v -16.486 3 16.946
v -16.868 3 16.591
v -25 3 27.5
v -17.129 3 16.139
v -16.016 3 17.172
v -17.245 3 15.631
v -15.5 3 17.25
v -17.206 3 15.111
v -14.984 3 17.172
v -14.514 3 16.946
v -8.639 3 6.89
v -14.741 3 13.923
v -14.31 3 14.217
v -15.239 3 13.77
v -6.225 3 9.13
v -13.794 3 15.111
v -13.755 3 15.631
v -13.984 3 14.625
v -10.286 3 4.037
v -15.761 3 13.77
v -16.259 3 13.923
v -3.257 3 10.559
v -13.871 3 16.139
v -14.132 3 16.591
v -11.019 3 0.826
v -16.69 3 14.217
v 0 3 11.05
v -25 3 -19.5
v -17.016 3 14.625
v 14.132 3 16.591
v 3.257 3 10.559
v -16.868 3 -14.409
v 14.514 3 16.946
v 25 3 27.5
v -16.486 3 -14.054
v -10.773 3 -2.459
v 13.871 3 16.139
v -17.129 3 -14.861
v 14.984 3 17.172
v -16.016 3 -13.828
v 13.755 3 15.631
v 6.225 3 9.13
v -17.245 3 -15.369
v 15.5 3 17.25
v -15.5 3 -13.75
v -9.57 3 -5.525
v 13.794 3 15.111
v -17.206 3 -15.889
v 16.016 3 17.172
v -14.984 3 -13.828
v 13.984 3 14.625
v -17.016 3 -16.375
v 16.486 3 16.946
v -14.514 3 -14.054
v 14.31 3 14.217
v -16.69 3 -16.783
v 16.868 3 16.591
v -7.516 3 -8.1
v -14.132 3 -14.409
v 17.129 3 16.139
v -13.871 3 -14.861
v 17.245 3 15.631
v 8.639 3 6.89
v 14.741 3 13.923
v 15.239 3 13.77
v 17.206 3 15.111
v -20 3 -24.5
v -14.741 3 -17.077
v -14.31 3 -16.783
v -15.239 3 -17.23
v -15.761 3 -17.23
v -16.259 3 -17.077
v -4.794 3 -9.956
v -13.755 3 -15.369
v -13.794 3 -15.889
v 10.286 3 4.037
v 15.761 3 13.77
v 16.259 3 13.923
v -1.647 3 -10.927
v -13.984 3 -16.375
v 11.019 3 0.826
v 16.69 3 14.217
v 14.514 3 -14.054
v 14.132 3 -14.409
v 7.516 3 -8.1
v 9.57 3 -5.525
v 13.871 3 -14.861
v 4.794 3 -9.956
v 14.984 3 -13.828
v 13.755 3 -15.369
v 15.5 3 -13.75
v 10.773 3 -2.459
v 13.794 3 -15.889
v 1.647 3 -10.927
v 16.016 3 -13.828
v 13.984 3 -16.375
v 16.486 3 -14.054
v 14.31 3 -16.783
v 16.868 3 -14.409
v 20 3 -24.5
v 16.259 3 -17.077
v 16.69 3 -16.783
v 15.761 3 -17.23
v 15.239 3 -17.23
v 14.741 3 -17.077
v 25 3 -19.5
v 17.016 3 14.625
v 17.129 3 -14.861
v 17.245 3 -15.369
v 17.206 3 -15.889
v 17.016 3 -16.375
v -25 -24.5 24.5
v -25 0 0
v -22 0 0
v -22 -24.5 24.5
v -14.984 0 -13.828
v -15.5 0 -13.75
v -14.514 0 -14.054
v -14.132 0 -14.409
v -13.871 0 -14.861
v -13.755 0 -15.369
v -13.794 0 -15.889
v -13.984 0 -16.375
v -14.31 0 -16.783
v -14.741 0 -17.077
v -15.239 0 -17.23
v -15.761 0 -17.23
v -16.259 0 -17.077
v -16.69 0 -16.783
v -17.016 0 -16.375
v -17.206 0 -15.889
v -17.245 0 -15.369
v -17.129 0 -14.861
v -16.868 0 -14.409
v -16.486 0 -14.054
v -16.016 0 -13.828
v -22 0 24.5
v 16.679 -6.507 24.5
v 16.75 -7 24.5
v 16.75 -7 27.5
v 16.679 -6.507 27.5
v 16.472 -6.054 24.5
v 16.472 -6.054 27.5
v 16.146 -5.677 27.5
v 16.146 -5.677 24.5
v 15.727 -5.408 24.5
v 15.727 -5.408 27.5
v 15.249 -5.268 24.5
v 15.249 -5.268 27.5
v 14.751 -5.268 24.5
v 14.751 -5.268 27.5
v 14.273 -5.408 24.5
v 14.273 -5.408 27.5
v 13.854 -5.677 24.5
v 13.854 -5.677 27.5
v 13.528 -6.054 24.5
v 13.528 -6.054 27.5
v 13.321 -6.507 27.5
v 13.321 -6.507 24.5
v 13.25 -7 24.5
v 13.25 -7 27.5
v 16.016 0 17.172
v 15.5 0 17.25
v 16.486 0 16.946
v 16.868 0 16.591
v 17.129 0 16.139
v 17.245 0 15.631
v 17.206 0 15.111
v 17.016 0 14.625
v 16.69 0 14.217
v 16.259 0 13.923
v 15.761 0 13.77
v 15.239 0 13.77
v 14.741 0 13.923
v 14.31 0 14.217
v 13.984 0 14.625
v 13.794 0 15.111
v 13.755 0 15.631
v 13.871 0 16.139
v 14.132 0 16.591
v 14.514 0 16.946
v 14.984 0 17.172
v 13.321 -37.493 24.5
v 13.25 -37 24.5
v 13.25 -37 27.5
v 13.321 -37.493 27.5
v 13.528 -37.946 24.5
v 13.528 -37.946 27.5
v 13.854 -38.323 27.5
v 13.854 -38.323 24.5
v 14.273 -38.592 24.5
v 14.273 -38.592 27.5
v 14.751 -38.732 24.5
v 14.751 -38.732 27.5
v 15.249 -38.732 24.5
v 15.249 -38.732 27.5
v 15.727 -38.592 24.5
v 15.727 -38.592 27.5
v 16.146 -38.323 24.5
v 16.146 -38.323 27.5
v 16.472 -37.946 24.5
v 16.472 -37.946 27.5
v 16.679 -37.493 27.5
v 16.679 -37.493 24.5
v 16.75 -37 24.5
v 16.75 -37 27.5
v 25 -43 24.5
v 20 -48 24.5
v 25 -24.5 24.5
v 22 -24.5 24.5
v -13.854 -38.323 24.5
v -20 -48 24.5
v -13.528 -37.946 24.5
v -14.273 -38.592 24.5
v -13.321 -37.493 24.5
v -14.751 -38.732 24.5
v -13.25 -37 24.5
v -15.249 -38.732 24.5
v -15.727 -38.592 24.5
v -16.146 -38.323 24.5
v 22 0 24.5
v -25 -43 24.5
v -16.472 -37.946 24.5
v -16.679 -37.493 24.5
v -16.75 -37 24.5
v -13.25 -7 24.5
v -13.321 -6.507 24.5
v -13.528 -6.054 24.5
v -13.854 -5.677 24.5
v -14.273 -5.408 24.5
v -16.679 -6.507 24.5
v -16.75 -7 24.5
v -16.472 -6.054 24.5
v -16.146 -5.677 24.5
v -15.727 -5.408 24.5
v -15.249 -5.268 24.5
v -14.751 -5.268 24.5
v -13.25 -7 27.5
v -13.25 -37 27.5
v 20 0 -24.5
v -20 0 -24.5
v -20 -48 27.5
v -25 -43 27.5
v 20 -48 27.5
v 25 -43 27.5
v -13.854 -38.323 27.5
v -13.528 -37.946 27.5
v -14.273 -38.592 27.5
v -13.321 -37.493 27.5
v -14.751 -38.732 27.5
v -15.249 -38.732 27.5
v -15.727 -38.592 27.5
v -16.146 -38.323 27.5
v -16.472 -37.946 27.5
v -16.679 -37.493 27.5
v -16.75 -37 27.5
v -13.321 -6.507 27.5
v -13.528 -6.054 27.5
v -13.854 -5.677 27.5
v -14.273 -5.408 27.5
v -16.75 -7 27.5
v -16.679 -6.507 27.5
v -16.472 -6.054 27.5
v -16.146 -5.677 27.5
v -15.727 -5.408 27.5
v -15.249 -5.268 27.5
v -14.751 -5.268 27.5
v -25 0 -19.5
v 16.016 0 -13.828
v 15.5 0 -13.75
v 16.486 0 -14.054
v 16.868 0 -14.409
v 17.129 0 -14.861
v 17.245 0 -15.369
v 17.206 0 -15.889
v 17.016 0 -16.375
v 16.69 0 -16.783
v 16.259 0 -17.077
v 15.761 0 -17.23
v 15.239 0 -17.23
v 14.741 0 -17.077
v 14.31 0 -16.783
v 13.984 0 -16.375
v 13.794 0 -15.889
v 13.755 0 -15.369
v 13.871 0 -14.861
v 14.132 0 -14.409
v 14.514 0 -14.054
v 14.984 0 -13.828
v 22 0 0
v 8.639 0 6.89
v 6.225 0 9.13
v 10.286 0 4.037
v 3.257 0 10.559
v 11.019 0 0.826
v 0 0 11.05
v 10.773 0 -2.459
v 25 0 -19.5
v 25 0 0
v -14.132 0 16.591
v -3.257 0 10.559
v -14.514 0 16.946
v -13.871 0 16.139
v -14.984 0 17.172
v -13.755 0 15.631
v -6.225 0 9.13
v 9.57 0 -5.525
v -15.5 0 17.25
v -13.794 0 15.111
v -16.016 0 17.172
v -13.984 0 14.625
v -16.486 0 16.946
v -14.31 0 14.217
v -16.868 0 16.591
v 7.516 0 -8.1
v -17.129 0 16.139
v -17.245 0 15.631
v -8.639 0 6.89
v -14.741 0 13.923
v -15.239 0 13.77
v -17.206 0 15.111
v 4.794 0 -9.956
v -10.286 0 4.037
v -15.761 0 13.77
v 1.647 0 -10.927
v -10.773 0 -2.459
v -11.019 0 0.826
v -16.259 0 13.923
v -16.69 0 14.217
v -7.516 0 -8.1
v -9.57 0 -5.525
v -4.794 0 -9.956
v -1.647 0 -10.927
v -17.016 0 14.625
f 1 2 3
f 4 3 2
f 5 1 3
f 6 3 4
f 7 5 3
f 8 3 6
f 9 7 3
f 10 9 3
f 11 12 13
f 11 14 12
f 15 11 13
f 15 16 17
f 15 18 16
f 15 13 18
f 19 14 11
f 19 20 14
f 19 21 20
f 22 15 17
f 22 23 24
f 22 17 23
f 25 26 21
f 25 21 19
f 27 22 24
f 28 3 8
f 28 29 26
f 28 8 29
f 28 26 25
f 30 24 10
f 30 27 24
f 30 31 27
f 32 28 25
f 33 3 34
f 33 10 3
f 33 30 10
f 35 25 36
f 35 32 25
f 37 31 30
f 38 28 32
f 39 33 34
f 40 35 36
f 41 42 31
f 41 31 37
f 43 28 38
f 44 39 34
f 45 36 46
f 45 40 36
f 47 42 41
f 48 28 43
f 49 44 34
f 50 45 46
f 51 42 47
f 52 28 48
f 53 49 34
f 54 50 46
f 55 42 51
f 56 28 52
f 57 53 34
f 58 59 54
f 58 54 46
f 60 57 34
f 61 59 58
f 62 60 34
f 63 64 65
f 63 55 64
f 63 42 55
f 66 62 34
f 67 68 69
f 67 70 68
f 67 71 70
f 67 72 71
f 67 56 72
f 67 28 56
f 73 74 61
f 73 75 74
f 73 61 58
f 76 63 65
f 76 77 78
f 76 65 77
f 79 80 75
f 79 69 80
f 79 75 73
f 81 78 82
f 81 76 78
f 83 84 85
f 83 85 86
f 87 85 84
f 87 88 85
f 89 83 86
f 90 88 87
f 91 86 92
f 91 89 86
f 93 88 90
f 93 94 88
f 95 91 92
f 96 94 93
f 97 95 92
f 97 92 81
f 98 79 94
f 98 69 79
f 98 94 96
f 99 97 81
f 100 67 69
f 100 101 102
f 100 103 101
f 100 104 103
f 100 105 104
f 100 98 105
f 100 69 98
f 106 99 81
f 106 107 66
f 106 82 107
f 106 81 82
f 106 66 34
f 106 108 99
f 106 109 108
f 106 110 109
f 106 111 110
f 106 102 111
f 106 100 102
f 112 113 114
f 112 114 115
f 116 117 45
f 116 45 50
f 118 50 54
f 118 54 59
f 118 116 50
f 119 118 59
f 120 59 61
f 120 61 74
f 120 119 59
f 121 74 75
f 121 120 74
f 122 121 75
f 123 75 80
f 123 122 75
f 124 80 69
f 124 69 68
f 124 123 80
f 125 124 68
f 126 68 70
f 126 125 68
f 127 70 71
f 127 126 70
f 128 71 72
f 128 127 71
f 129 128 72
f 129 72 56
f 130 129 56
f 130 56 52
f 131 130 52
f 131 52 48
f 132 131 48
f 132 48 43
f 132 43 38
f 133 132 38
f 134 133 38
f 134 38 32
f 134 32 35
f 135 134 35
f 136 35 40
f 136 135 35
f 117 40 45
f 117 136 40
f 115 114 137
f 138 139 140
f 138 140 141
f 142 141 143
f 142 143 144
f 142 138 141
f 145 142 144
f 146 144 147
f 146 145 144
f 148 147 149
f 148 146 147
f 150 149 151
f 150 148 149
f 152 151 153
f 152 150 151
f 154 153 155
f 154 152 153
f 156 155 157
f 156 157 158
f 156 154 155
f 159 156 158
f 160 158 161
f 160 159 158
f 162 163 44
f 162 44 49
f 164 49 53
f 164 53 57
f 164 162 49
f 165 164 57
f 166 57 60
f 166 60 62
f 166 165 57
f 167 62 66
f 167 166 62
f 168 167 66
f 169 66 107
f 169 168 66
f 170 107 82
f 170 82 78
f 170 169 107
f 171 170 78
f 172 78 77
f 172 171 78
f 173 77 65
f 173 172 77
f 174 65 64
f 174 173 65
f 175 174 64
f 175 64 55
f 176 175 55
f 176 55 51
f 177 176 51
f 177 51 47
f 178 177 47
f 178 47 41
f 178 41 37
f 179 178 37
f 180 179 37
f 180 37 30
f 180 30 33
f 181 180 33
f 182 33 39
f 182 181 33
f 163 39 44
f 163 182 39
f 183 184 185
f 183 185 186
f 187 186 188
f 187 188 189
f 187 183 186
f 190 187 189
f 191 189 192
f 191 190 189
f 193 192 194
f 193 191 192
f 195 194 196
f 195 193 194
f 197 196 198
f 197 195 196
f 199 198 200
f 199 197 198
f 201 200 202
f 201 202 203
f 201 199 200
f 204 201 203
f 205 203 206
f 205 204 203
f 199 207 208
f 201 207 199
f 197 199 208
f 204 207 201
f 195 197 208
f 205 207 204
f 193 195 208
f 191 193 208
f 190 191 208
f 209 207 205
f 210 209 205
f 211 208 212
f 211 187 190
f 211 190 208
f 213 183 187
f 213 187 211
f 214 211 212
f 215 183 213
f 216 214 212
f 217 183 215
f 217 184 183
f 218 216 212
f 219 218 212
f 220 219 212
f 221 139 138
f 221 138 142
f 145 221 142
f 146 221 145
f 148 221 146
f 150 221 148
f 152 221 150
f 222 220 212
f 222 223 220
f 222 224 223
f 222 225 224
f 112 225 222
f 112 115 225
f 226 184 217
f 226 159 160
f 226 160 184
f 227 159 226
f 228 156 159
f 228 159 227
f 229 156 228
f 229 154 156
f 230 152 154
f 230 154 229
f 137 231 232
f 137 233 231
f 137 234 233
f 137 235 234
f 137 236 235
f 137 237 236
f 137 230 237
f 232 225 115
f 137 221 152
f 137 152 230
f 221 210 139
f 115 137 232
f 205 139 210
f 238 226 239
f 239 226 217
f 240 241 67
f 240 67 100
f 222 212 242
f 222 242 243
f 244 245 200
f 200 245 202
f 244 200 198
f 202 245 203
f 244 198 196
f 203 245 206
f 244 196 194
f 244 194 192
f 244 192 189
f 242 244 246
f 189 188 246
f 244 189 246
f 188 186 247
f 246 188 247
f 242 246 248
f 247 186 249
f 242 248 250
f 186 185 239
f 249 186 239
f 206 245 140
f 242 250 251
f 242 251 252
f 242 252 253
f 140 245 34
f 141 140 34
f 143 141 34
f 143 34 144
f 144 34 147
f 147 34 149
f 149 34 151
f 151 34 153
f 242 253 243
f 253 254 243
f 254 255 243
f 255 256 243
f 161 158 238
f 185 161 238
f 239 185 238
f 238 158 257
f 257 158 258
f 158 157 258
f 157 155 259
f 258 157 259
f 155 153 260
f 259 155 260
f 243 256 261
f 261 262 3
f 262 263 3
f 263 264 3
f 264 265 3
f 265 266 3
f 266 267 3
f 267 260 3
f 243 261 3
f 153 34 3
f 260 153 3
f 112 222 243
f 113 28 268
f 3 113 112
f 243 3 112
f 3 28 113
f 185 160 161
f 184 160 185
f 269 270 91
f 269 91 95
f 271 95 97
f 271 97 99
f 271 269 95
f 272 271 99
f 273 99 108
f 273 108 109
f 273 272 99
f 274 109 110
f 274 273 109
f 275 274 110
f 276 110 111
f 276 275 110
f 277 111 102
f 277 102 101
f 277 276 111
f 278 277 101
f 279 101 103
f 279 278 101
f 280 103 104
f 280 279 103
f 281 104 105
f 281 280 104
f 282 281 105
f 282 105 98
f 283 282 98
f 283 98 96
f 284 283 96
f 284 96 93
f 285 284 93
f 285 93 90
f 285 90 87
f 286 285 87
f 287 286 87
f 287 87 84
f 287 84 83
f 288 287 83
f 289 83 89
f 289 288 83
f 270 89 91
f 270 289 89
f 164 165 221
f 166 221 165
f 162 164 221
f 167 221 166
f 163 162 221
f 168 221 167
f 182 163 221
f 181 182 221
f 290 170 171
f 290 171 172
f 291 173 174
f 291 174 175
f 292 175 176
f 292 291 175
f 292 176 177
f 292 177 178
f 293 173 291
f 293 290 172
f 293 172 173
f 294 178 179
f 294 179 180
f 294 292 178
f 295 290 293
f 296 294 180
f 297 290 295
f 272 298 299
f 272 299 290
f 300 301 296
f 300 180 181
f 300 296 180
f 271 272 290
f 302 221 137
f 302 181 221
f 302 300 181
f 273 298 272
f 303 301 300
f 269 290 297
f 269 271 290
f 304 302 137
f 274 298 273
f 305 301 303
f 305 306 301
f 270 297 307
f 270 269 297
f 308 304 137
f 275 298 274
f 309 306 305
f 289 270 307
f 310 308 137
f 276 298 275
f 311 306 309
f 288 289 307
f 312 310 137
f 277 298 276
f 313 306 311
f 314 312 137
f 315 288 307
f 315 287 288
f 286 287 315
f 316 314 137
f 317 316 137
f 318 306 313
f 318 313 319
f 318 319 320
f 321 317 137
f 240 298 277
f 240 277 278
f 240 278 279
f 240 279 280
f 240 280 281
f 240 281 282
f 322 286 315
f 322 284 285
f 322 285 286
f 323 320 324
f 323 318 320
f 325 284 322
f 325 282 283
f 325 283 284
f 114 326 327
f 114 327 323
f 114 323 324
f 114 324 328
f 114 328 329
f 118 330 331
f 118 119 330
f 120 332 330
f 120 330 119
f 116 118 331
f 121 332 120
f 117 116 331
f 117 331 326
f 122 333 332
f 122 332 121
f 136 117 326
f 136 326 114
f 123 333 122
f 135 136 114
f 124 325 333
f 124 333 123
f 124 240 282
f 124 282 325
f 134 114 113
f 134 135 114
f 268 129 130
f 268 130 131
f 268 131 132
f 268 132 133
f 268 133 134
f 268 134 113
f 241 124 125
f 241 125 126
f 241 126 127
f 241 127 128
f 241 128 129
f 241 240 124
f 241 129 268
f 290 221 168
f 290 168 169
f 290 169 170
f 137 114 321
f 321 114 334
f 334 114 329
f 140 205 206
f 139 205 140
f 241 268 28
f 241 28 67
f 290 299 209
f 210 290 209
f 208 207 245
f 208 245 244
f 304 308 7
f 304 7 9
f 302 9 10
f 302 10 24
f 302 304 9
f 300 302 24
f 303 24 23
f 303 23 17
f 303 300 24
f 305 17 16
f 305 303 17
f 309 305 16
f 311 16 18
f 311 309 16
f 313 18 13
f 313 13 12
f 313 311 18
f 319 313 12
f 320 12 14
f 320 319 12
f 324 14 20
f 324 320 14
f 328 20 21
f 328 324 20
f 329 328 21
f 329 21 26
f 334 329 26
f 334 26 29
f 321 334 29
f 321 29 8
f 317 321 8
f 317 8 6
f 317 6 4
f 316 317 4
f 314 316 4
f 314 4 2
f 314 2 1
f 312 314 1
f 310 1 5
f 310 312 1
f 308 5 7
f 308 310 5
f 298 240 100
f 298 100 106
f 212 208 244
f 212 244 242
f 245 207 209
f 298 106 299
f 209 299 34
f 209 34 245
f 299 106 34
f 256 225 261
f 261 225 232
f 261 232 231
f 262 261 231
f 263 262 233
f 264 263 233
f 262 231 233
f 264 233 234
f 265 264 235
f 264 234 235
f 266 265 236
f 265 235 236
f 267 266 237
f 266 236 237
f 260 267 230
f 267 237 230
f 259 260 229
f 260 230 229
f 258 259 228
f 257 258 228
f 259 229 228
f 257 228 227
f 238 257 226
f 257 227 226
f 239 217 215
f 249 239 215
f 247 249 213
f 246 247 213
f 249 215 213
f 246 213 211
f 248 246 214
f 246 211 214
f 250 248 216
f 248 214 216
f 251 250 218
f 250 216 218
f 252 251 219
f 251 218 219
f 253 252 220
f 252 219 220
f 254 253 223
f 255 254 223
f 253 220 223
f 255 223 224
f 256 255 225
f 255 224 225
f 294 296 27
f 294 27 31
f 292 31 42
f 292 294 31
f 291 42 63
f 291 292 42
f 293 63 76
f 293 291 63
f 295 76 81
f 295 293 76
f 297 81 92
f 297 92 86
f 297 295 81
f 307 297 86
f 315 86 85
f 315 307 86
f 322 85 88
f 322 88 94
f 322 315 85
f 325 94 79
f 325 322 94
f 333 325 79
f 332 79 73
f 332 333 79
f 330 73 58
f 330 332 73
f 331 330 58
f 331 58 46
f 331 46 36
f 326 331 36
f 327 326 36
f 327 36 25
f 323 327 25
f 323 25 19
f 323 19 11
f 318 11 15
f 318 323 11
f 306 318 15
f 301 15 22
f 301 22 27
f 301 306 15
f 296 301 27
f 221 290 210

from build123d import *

# Parameters (mm, degrees)
SKETCH_1_R      = 11.05
SKETCH_1_R_2    = 1.75
EXTRUDE_1_DEPTH = 3
EXTRUDE_2_DEPTH = 3
EXTRUDE_3_DEPTH = 3


with BuildPart() as part:
    # 草图1 → 凸台-拉伸1 (new body)
    with BuildSketch(Plane(origin=(0, 0, 0), x_dir=(1, 0, 0), z_dir=(0, 1, 0))):
        Polygon((-25, 19.5), (-20, 24.5), (20, 24.5), (25, 19.5), (25, -24.5), (-25, -24.5), align=None)
        with Locations(Location((0, 0, 0), (0, 0, 270))):
            Circle(SKETCH_1_R, mode=Mode.SUBTRACT)
        with Locations(Location((15.5, 15.5, 0), (0, 0, 270))):
            Circle(SKETCH_1_R_2, mode=Mode.SUBTRACT)
        with Locations(Location((15.5, -15.5, 0), (0, 0, 270))):
            Circle(SKETCH_1_R_2, mode=Mode.SUBTRACT)
        with Locations(Location((-15.5, -15.5, 0), (0, 0, 270))):
            Circle(SKETCH_1_R_2, mode=Mode.SUBTRACT)
        with Locations(Location((-15.5, 15.5, 0), (0, 0, 270))):
            Circle(SKETCH_1_R_2, mode=Mode.SUBTRACT)
    extrude(amount=EXTRUDE_1_DEPTH)

    # 草图3 → 凸台-拉伸2 (add)
    with BuildSketch(Plane.XY.offset(24.5)):
        Polygon((-25, 3), (25, 3), (25, -43), (20, -48), (-20, -48), (-25, -43), align=None)
        with BuildLine():
            Line((-13.25, -7), (-13.25, -37))
            ThreePointArc((-13.25, -37), (-15, -38.75), (-16.75, -37))
            Line((-16.75, -37), (-16.75, -7))
            ThreePointArc((-16.75, -7), (-15, -5.25), (-13.25, -7))
        make_face(mode=Mode.SUBTRACT)
        with BuildLine():
            Line((13.25, -7), (13.25, -37))
            ThreePointArc((13.25, -37), (15, -38.75), (16.75, -37))
            Line((16.75, -37), (16.75, -7))
            ThreePointArc((16.75, -7), (15, -5.25), (13.25, -7))
        make_face(mode=Mode.SUBTRACT)
    extrude(amount=EXTRUDE_2_DEPTH)

    # 草图4 → 凸台-拉伸3 (add)
    with BuildSketch(Plane(origin=(25, 0, 0), x_dir=(0, 0, -1), z_dir=(1, 0, 0))):
        Polygon((-24.5, 0), (0, 0), (-24.5, -24.5), align=None)
    extrude_3 = extrude(amount=-EXTRUDE_3_DEPTH)

    # 镜向1: 凸台-拉伸3 across plane
    add(extrude_3.mirror(Plane(origin=(0, 0, 0), x_dir=(0, 0, 1), z_dir=(1, 0, 0))))


solid = part.part
